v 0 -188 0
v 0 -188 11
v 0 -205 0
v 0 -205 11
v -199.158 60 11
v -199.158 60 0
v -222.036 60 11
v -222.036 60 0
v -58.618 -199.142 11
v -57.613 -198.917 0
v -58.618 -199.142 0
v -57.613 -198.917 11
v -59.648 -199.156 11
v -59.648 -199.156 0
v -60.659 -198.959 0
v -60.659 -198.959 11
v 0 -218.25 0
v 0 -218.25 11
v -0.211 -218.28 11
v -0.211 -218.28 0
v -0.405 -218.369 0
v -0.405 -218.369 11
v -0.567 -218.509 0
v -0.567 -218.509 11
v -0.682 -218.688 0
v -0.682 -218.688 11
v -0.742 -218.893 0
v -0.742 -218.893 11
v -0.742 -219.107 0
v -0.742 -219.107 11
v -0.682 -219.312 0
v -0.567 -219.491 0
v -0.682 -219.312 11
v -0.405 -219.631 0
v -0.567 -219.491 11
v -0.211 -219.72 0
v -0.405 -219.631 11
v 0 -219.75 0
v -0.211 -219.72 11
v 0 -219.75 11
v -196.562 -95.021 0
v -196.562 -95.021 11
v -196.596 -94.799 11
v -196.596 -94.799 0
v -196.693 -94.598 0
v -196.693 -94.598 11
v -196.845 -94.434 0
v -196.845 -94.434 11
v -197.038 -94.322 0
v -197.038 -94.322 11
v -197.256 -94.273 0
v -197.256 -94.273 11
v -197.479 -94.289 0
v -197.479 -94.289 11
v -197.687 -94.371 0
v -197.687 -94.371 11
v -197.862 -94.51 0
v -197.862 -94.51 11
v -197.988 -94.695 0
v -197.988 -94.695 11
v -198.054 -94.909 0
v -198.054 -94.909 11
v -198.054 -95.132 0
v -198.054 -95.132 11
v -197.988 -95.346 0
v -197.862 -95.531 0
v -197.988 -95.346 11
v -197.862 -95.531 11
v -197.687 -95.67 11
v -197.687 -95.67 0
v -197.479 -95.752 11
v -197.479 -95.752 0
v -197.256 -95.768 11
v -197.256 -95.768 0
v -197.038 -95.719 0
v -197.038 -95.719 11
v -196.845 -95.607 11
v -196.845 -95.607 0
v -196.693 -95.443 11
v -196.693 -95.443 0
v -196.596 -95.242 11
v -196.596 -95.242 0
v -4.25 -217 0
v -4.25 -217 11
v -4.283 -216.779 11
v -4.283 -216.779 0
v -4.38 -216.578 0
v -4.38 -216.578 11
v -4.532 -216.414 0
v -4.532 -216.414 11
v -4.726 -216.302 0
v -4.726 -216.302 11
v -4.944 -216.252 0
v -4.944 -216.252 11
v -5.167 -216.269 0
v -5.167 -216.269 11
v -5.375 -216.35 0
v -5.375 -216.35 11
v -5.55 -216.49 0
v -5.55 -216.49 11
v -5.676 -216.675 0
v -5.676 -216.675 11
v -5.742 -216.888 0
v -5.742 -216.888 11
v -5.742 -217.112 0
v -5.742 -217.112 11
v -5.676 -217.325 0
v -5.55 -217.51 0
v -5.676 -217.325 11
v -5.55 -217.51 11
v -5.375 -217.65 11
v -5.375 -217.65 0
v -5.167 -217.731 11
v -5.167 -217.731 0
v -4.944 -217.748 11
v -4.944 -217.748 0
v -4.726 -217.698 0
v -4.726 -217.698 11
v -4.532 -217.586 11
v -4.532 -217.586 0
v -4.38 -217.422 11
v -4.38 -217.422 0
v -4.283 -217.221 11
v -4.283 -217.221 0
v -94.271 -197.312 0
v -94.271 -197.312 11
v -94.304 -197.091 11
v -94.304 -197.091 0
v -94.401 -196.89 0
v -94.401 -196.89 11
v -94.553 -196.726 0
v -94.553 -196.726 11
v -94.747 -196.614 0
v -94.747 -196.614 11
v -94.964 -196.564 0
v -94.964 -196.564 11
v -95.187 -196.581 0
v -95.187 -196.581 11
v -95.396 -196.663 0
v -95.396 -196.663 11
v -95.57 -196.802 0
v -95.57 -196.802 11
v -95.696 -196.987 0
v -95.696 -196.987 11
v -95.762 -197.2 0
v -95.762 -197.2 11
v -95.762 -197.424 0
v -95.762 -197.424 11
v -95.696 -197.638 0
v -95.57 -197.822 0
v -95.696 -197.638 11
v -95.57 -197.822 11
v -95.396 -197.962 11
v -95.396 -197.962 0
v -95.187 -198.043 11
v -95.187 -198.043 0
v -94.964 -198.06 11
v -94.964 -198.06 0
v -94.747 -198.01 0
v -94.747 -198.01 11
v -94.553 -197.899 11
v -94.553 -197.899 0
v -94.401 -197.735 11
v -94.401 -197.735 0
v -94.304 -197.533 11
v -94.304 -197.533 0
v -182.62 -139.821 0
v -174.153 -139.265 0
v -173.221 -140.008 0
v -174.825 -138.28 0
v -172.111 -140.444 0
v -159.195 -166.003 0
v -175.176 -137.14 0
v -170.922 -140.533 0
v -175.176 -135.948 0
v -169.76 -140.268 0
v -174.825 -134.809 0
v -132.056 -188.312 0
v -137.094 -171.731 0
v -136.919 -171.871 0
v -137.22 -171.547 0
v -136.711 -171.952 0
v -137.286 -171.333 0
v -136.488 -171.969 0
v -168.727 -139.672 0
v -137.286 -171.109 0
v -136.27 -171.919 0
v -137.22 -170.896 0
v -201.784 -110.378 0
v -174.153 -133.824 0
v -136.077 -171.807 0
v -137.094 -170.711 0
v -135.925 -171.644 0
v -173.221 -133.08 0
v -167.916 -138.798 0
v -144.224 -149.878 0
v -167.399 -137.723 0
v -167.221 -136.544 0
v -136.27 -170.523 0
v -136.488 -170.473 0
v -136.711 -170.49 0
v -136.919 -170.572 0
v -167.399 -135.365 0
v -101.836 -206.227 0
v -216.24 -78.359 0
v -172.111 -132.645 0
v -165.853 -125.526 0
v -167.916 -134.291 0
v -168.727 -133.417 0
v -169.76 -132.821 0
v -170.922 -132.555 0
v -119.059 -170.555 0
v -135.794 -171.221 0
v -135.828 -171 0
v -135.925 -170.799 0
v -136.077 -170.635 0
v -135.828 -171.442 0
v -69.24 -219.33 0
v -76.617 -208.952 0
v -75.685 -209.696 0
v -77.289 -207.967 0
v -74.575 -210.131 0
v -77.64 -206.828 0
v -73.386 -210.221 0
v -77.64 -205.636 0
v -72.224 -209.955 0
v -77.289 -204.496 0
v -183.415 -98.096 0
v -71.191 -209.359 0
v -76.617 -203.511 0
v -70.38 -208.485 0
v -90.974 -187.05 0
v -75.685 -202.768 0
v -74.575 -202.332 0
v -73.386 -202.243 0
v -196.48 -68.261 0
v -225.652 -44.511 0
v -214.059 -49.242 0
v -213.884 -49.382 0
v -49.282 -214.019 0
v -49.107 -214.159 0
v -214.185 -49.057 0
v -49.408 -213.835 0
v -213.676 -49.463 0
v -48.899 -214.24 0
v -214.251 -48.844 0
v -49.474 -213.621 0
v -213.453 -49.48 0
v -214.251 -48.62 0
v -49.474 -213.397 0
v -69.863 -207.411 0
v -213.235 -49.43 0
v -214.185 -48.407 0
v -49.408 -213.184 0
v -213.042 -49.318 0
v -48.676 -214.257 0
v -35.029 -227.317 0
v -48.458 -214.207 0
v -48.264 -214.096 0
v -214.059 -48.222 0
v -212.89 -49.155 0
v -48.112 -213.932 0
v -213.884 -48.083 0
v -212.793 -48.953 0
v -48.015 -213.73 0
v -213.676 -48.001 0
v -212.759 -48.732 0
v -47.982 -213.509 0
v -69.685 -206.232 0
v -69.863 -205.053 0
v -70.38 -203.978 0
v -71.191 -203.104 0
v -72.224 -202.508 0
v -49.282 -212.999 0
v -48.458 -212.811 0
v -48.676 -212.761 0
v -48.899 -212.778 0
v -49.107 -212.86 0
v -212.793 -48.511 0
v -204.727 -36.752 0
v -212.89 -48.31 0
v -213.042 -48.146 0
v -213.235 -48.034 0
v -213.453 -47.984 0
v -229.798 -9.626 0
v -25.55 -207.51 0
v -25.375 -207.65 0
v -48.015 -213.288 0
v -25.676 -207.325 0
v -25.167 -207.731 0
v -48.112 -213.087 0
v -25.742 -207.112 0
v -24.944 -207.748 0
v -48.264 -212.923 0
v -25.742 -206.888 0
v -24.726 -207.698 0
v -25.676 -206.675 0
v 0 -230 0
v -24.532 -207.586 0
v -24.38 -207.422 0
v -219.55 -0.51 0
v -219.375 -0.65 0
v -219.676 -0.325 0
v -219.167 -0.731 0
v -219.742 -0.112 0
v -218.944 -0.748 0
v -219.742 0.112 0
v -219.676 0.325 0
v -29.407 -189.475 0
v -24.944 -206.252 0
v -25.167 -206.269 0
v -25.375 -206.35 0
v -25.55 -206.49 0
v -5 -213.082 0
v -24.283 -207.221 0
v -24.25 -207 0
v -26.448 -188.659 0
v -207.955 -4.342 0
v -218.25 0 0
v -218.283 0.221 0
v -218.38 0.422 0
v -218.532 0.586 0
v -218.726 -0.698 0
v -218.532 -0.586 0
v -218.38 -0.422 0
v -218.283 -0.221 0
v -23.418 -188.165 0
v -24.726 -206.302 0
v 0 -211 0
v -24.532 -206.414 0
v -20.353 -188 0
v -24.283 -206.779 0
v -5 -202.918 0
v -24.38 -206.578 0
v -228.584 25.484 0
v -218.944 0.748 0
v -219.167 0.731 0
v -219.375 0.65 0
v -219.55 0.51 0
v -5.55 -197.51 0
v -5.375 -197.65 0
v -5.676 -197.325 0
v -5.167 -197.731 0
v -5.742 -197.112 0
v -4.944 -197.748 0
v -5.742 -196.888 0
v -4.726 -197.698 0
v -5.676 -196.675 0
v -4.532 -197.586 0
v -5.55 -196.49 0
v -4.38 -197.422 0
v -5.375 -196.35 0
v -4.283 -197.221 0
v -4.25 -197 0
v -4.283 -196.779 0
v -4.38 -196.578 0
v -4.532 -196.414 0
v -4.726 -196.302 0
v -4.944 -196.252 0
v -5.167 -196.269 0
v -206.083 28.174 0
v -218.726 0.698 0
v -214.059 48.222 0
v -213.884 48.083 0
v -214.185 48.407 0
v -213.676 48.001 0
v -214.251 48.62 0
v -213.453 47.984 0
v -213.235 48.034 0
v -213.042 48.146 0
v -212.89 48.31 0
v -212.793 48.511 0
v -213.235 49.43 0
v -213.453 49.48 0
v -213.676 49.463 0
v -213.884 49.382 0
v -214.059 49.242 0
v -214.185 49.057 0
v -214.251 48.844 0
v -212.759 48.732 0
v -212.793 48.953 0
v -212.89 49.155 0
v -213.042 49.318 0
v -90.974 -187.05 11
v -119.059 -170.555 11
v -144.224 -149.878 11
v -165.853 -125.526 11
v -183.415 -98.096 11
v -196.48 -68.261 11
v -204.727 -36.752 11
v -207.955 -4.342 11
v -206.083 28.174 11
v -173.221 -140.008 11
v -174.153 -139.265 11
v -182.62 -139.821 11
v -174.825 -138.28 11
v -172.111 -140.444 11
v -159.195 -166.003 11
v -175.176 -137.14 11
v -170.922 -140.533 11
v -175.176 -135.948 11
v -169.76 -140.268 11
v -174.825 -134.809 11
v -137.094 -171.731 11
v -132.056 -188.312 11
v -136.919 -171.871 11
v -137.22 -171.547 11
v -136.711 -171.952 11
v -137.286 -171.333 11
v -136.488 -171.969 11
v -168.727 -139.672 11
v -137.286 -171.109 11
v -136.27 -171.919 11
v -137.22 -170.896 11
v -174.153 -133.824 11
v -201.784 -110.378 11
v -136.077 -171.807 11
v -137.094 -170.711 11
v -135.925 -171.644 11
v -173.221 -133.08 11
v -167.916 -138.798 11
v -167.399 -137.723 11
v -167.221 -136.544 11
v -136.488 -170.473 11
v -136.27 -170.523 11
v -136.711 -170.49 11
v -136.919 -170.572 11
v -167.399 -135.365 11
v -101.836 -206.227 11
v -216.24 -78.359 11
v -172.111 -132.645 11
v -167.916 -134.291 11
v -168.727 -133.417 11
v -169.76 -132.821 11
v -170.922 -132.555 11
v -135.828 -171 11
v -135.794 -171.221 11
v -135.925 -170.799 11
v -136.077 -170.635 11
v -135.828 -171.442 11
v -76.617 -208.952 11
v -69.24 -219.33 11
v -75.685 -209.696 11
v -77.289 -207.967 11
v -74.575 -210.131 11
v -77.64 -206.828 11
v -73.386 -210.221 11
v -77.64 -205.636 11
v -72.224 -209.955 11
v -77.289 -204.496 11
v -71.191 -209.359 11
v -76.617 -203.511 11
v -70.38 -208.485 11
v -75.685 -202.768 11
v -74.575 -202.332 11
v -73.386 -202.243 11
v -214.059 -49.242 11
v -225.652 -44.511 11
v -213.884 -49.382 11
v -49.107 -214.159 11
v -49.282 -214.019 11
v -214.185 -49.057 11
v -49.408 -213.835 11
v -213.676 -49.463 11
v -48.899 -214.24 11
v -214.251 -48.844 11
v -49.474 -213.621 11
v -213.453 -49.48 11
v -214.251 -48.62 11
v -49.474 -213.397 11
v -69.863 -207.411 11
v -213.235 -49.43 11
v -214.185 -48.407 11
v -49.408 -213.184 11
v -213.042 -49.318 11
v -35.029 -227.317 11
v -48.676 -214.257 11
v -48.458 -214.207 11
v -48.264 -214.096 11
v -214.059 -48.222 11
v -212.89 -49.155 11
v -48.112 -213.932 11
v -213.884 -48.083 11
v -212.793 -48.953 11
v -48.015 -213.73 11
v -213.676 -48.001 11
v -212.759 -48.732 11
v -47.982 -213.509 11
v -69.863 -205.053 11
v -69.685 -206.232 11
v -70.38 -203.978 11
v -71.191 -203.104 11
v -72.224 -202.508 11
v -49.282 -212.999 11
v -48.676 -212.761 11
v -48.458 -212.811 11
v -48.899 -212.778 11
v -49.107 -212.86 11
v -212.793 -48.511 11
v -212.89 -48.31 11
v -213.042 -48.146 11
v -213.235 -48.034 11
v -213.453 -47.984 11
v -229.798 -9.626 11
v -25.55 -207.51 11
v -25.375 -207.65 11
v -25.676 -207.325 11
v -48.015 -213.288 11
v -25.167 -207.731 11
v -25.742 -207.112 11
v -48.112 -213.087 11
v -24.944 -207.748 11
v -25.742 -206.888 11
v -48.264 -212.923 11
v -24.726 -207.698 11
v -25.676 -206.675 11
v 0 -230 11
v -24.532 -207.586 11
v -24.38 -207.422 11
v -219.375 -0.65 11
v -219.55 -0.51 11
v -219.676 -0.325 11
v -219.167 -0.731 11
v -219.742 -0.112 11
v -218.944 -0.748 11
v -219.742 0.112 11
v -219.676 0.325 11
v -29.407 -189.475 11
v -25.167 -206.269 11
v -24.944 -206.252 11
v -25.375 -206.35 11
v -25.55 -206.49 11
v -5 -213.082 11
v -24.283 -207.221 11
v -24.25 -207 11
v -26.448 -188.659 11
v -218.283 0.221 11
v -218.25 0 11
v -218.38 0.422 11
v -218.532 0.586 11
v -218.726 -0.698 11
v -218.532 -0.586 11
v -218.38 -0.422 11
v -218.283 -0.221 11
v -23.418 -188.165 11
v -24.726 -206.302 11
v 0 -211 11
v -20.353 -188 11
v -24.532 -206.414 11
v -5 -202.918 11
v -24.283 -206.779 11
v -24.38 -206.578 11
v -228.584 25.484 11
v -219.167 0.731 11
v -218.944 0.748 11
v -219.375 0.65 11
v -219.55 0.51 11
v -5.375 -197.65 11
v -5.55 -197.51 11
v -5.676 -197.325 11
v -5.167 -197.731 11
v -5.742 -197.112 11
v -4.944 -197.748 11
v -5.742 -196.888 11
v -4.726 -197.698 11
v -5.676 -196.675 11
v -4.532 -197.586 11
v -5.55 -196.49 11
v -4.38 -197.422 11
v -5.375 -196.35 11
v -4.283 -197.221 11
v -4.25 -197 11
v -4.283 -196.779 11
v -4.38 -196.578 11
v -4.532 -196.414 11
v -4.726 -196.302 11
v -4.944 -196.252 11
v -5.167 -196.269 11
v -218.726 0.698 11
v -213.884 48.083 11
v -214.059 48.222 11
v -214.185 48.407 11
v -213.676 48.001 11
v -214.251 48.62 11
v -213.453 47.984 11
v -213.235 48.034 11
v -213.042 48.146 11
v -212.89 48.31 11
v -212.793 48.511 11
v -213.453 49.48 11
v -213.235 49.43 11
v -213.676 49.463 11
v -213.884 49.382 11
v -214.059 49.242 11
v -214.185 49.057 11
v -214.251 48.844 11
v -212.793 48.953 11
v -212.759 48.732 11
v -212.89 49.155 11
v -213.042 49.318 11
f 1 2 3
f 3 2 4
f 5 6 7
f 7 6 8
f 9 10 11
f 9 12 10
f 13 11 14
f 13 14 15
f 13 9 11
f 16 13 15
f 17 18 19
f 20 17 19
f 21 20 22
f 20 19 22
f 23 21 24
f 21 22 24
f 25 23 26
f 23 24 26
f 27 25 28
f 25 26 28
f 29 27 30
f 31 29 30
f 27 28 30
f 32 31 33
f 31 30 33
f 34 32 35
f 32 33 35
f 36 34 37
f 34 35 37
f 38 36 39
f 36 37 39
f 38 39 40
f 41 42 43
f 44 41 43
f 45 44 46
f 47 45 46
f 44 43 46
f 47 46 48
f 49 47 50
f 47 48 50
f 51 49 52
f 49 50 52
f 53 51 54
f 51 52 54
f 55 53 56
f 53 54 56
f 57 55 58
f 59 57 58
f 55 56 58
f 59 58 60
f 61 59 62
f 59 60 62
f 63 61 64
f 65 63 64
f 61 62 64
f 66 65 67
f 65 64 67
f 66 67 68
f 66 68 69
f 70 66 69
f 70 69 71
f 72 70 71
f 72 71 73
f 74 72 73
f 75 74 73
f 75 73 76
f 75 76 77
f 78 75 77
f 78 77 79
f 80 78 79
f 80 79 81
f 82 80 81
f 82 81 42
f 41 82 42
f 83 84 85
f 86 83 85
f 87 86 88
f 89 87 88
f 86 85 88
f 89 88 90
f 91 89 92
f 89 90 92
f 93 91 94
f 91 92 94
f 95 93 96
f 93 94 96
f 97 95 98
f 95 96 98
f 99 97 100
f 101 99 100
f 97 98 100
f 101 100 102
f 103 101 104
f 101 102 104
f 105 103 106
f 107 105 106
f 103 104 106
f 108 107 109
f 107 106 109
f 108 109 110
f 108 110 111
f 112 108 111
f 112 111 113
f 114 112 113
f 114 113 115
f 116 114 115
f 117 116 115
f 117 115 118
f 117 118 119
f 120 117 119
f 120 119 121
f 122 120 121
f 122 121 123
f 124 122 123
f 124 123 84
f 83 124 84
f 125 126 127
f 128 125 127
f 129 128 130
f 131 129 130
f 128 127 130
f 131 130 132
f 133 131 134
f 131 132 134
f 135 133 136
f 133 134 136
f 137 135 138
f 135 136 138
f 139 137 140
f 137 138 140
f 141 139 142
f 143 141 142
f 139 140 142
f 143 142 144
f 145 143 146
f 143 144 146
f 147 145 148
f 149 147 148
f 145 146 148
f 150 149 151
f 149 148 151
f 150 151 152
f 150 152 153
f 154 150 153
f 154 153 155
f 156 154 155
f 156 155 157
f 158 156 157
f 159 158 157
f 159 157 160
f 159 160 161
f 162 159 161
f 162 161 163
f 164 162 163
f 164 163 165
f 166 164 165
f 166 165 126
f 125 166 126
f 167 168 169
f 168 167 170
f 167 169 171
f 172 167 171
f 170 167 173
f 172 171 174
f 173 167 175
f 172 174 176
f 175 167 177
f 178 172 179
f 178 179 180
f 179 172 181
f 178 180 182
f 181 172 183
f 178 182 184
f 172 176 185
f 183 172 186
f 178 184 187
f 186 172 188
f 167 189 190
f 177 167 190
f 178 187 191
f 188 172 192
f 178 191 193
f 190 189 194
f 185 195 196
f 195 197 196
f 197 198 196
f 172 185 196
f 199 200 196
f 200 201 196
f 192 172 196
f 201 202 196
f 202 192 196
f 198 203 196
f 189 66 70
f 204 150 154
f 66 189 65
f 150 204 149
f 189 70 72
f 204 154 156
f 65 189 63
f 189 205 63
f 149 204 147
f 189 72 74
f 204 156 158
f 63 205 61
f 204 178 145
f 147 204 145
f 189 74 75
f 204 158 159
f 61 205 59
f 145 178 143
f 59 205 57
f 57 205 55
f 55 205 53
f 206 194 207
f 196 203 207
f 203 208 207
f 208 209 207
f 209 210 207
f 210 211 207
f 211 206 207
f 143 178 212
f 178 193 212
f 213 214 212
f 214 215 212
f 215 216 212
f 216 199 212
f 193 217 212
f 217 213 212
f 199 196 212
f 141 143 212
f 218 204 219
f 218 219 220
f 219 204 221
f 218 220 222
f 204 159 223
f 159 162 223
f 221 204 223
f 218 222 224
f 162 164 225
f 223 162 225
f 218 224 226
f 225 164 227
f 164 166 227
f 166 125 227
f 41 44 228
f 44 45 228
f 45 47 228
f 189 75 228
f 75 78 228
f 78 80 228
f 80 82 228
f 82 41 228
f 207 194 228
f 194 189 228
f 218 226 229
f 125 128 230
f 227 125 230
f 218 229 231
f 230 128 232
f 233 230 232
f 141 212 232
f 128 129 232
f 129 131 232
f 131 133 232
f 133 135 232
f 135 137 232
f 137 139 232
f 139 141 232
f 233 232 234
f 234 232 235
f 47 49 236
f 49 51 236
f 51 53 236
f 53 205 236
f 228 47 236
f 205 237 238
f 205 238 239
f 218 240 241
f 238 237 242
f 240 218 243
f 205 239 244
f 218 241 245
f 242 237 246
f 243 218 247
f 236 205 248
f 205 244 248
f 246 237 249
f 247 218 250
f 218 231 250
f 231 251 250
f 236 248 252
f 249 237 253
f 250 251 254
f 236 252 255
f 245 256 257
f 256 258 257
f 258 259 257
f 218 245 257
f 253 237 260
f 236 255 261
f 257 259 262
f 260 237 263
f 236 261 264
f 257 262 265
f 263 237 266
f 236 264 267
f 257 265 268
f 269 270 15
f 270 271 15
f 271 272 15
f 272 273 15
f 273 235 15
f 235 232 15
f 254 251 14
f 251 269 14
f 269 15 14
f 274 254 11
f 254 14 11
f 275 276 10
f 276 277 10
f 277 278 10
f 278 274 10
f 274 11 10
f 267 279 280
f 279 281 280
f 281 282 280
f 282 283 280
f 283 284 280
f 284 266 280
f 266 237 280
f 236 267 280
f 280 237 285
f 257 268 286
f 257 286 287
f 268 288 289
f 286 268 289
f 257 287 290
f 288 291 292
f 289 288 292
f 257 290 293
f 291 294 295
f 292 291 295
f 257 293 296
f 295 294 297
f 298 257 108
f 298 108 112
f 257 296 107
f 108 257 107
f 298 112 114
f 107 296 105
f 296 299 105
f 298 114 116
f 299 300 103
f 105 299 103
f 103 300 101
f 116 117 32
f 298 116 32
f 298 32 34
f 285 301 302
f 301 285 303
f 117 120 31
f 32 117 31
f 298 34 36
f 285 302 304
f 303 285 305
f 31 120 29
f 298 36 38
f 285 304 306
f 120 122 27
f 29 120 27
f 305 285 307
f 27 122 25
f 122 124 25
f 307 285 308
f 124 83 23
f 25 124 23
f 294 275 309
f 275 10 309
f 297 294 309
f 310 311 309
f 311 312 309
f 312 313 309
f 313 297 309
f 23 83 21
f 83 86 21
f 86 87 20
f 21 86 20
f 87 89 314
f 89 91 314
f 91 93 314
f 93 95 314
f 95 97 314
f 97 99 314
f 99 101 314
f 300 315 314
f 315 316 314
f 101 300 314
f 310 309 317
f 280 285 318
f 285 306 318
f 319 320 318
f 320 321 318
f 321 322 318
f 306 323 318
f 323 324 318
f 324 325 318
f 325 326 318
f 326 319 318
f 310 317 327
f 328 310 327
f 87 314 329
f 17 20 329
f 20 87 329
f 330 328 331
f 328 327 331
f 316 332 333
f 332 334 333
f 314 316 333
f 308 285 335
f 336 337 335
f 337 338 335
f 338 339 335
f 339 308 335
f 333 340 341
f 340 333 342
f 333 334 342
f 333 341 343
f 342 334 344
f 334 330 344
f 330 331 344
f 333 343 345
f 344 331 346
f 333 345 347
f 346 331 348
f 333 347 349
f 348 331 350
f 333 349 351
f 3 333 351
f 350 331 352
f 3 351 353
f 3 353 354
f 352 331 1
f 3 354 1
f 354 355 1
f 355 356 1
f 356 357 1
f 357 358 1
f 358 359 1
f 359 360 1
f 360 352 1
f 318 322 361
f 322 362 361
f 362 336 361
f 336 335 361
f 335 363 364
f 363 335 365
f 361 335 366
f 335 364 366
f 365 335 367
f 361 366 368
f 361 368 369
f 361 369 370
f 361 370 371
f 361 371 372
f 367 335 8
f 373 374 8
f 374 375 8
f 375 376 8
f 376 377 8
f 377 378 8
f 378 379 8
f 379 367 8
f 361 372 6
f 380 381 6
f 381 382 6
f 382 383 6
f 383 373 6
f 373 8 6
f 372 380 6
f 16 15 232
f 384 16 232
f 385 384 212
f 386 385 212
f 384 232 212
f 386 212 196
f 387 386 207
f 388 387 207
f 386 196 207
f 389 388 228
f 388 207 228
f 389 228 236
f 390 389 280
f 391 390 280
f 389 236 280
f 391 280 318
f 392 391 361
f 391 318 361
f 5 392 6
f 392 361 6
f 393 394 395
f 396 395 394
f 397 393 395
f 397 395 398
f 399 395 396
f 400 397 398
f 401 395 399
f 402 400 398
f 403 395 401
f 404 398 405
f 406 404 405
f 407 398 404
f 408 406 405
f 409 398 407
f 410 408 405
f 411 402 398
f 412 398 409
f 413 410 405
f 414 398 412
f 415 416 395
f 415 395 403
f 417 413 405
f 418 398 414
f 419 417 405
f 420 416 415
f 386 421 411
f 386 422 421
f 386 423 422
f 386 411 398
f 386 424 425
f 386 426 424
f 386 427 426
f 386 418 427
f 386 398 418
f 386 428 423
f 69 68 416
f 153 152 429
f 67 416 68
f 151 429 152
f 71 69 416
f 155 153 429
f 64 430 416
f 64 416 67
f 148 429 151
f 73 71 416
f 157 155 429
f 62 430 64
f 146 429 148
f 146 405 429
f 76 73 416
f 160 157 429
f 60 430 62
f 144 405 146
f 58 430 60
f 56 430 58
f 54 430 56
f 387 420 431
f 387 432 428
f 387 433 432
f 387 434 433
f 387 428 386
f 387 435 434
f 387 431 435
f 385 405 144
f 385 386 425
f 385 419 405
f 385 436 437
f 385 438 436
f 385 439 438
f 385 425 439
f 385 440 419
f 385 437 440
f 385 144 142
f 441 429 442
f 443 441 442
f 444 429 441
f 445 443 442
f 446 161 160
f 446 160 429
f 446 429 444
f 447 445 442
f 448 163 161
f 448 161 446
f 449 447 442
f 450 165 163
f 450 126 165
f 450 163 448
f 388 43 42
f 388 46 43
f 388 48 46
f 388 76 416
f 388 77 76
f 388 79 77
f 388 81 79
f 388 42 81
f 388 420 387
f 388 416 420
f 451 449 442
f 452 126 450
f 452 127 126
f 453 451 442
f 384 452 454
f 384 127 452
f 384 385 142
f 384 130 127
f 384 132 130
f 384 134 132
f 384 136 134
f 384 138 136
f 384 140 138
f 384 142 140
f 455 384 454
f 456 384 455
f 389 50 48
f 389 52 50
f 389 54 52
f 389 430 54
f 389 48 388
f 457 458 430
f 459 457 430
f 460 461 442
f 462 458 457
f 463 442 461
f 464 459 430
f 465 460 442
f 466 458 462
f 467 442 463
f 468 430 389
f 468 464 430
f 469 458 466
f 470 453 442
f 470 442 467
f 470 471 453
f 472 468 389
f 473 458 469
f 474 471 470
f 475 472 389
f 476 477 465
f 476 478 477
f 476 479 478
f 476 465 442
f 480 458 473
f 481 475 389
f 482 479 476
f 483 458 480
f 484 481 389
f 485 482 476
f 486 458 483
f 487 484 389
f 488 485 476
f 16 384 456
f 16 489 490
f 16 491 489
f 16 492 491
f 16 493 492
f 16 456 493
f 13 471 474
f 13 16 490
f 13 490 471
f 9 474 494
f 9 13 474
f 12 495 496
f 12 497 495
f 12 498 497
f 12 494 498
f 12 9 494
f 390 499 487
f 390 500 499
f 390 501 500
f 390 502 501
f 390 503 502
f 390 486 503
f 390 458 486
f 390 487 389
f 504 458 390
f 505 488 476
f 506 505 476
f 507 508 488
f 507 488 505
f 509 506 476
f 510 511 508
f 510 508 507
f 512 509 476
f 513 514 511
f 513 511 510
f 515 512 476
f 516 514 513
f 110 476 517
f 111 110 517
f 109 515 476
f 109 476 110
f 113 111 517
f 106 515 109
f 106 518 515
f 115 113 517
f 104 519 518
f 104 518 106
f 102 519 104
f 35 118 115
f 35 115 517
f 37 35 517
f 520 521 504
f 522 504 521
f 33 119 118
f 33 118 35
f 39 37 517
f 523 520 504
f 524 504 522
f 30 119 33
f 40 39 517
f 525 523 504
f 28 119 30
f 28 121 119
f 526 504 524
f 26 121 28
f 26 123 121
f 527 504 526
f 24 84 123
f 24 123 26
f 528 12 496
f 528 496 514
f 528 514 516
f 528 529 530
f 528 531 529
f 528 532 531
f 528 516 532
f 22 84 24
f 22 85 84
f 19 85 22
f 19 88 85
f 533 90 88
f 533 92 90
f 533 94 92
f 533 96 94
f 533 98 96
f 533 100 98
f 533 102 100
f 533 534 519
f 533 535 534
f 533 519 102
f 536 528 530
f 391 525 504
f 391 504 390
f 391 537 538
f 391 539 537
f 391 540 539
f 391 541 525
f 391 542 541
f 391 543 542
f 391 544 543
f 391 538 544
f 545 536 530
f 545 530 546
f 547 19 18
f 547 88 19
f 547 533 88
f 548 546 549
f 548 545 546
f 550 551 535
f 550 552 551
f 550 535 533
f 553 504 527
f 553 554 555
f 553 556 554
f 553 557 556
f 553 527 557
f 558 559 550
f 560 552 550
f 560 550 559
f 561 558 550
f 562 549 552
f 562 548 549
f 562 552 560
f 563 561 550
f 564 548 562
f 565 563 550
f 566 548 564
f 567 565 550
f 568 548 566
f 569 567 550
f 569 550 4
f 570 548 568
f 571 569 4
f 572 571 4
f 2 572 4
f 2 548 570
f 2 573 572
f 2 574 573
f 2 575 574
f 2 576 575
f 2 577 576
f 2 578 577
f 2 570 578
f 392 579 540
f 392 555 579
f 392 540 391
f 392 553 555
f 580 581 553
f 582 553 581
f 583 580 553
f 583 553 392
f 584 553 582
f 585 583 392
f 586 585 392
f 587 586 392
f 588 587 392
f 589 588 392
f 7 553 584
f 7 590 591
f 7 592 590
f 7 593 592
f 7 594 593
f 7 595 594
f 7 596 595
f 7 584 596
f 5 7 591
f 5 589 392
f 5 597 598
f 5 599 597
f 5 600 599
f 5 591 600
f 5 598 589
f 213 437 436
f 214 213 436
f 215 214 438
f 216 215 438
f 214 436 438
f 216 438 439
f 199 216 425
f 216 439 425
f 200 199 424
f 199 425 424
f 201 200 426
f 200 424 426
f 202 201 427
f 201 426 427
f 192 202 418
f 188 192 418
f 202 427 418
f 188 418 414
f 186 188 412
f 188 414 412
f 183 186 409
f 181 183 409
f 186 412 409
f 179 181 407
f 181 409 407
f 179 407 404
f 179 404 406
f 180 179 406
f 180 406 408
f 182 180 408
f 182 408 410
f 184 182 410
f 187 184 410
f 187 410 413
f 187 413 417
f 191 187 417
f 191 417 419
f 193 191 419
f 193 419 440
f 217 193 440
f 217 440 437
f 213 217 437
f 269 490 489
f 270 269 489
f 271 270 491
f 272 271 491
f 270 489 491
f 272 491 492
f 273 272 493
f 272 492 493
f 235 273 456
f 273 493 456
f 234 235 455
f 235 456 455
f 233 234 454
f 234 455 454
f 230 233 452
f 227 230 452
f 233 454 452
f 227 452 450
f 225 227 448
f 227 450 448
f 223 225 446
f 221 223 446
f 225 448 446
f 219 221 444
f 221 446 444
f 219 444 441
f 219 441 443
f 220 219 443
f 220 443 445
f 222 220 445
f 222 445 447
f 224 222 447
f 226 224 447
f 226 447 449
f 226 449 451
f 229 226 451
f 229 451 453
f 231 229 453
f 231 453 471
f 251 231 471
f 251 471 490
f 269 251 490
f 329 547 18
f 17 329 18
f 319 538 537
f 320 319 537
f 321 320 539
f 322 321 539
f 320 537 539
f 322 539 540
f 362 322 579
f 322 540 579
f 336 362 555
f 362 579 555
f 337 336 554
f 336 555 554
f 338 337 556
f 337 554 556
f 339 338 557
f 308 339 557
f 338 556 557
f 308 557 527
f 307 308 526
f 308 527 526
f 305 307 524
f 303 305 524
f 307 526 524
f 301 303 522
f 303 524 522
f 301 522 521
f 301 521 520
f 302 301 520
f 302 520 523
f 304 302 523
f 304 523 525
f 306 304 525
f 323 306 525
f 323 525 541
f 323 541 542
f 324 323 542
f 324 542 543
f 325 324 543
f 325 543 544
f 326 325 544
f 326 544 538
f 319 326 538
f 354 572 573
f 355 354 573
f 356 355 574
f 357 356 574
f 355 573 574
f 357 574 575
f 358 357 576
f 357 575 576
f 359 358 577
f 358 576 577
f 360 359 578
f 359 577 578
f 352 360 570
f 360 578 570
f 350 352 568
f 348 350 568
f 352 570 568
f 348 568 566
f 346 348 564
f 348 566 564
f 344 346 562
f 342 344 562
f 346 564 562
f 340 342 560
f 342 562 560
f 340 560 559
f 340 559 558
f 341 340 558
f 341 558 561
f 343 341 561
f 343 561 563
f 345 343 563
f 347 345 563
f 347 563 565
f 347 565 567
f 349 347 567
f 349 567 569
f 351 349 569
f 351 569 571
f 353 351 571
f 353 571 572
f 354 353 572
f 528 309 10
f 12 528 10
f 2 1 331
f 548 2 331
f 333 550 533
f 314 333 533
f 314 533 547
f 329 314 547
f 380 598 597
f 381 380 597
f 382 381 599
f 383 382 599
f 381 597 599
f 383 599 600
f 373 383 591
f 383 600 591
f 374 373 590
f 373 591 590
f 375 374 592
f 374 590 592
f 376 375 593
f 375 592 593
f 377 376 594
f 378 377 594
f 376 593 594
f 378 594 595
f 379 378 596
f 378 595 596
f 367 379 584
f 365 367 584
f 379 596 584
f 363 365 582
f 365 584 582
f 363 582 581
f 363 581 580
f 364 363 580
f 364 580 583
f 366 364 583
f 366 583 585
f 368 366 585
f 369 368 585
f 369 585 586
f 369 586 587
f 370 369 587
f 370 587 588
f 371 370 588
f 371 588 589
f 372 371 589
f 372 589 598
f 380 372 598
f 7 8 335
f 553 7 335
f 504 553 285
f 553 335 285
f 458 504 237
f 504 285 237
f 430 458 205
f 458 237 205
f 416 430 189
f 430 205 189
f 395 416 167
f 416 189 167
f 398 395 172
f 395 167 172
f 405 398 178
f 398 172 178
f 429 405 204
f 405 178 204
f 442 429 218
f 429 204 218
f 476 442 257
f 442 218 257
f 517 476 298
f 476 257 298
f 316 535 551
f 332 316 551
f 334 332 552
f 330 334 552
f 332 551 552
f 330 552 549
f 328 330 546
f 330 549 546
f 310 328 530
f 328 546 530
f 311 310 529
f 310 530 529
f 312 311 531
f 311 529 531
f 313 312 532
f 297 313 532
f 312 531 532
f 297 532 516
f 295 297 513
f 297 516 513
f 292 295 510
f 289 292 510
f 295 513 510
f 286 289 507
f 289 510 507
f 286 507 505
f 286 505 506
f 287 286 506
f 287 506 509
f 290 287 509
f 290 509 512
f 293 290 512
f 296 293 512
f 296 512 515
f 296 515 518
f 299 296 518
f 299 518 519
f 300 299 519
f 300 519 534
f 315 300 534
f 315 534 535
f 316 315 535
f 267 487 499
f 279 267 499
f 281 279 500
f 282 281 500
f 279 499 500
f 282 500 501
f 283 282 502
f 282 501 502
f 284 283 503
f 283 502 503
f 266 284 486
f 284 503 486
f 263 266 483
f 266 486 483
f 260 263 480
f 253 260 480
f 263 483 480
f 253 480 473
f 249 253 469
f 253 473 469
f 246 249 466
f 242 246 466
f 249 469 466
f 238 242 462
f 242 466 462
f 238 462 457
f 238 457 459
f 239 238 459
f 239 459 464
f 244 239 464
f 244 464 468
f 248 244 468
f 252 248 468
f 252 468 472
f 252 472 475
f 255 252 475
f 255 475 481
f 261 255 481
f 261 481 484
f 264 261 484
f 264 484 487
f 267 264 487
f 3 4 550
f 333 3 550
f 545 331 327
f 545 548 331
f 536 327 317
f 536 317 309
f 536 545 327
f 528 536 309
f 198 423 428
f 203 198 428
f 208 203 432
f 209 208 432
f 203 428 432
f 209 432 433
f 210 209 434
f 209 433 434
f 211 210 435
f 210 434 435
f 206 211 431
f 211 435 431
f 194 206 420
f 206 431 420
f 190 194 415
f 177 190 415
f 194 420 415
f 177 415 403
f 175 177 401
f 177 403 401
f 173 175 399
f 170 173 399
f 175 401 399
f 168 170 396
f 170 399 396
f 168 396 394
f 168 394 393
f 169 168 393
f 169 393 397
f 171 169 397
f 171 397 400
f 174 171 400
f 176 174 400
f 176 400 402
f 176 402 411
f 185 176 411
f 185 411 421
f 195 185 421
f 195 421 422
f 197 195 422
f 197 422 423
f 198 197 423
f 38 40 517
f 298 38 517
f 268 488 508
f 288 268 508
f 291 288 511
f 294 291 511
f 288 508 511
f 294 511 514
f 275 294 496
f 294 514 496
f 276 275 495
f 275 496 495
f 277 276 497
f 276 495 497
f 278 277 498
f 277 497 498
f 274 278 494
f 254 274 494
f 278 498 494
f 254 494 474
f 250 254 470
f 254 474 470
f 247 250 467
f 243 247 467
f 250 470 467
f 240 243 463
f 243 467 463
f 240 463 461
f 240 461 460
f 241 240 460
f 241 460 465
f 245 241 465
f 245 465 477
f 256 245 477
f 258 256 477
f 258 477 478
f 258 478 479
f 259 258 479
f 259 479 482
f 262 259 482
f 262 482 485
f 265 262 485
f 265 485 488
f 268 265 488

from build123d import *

# Parameters (mm, degrees)
F1_DEPTH  = 11
F2_R      = 28.523991
F3_R      = 5
F5_R      = 0.75
F5_R_2    = 4
F6_DEPTH  = 11.001
F7_R      = 4
F8_DEPTH  = 11.001
F10_DEPTH = 11.001


with BuildPart() as f1:
    # F0 (on Top) → F1 (new body)
    with BuildSketch(Plane.XY):
        with BuildLine():
            ThreePointArc((-59.119348, -199.42142), (-183.034682, -98.804378), (-199.158229, 60))
            Line((-199.158229, 60), (-222.036033, 60))
            ThreePointArc((-222.036033, 60), (0, -230), (222.036033, 60))
            Line((222.036033, 60), (199.158229, 60))
            ThreePointArc((199.158229, 60), (183.034682, -98.804378), (59.119348, -199.42142))
            Line((59.119348, -199.42142), (25, -188))
            Line((25, -188), (0, -188))
            Line((0, -188), (-25, -188))
            Line((-25, -188), (-59.119348, -199.42142))
        make_face()
    extrude(amount=F1_DEPTH)

    # F2
    f2_edges = [f1.edges().sort_by_distance(p)[0] for p in [
        (25, -188, 5.5),
        (-25, -188, 5.5),
    ]]
    fillet(f2_edges, radius=F2_R)

    # F3
    f3_edges = [f1.edges().sort_by_distance(p)[0] for p in [
        (59.119348, -199.42142, 5.5),
        (-59.119348, -199.42142, 5.5),
    ]]
    fillet(f3_edges, radius=F3_R)

    # F5 (on face) → F6 (cut, through all)
    with BuildSketch(Plane.XY.offset(11)):
        with Locations((0, -219)):
            Circle(F5_R)
        with Locations((48.732085, -213.509213)):
            Circle(F5_R)
        with Locations((95.020539, -197.312182)):
            Circle(F5_R)
        with Locations((136.544267, -171.221095)):
            Circle(F5_R)
        with Locations((171.221095, -136.544267)):
            Circle(F5_R)
        with Locations((197.312182, -95.020539)):
            Circle(F5_R)
        with Locations((213.509213, -48.732085)):
            Circle(F5_R)
        with Locations((219, 0)):
            Circle(F5_R)
        with Locations((213.509213, 48.732085)):
            Circle(F5_R)
        with Locations((197.312182, 95.020539)):
            Circle(F5_R)
        with Locations((171.221095, 136.544267)):
            Circle(F5_R)
        with Locations((136.544267, 171.221095)):
            Circle(F5_R)
        with Locations((95.020539, 197.312182)):
            Circle(F5_R)
        with Locations((48.732085, 213.509213)):
            Circle(F5_R)
        with Locations((0, 219)):
            Circle(F5_R)
        with Locations((-48.732085, 213.509213)):
            Circle(F5_R)
        with Locations((-95.020539, 197.312182)):
            Circle(F5_R)
        with Locations((-136.544267, 171.221095)):
            Circle(F5_R)
        with Locations((-171.221095, 136.544267)):
            Circle(F5_R)
        with Locations((-197.312182, 95.020539)):
            Circle(F5_R)
        with Locations((-213.509213, 48.732085)):
            Circle(F5_R)
        with Locations((-219, 0)):
            Circle(F5_R)
        with Locations((-213.509213, -48.732085)):
            Circle(F5_R)
        with Locations((-197.312182, -95.020539)):
            Circle(F5_R)
        with Locations((-171.221095, -136.544267)):
            Circle(F5_R)
        with Locations((-136.544267, -171.221095)):
            Circle(F5_R)
        with Locations((-95.020539, -197.312182)):
            Circle(F5_R)
        with Locations((-48.732085, -213.509213)):
            Circle(F5_R)
        with Locations((-5, -197)):
            Circle(F5_R)
        with Locations((5, -197)):
            Circle(F5_R)
        with Locations((0, -208)):
            Circle(F5_R)
        with Locations((-5, -217)):
            Circle(F5_R)
        with Locations((-25, -207)):
            Circle(F5_R)
        with Locations((5, -217)):
            Circle(F5_R)
        with Locations((25, -207)):
            Circle(F5_R)
        with Locations((-73.684961, -206.23173)):
            Circle(F5_R_2)
    extrude(amount=-F6_DEPTH, mode=Mode.SUBTRACT)

    # F7 (on face) → F8 (cut, through all)
    with BuildSketch(Plane.XY.offset(11)):
        with Locations((-171.221095, -136.544267)):
            Circle(F7_R)
        with Locations((171.221095, -136.544267)):
            Circle(F7_R)
    extrude(amount=-F8_DEPTH, mode=Mode.SUBTRACT)

    # F9 (on face) → F10 (cut, through all)
    with BuildSketch(Plane.XY.offset(11)):
        Polygon((0, 85.640151), (0, -188), (0, -205), (-5, -202.917908), (-5, -213.082092), (0, -211), (0, -251.474887), (263.787508, -251.474887), (263.787508, 85.640151), align=None)
    extrude(amount=-F10_DEPTH, mode=Mode.SUBTRACT)


solid = f1.part
